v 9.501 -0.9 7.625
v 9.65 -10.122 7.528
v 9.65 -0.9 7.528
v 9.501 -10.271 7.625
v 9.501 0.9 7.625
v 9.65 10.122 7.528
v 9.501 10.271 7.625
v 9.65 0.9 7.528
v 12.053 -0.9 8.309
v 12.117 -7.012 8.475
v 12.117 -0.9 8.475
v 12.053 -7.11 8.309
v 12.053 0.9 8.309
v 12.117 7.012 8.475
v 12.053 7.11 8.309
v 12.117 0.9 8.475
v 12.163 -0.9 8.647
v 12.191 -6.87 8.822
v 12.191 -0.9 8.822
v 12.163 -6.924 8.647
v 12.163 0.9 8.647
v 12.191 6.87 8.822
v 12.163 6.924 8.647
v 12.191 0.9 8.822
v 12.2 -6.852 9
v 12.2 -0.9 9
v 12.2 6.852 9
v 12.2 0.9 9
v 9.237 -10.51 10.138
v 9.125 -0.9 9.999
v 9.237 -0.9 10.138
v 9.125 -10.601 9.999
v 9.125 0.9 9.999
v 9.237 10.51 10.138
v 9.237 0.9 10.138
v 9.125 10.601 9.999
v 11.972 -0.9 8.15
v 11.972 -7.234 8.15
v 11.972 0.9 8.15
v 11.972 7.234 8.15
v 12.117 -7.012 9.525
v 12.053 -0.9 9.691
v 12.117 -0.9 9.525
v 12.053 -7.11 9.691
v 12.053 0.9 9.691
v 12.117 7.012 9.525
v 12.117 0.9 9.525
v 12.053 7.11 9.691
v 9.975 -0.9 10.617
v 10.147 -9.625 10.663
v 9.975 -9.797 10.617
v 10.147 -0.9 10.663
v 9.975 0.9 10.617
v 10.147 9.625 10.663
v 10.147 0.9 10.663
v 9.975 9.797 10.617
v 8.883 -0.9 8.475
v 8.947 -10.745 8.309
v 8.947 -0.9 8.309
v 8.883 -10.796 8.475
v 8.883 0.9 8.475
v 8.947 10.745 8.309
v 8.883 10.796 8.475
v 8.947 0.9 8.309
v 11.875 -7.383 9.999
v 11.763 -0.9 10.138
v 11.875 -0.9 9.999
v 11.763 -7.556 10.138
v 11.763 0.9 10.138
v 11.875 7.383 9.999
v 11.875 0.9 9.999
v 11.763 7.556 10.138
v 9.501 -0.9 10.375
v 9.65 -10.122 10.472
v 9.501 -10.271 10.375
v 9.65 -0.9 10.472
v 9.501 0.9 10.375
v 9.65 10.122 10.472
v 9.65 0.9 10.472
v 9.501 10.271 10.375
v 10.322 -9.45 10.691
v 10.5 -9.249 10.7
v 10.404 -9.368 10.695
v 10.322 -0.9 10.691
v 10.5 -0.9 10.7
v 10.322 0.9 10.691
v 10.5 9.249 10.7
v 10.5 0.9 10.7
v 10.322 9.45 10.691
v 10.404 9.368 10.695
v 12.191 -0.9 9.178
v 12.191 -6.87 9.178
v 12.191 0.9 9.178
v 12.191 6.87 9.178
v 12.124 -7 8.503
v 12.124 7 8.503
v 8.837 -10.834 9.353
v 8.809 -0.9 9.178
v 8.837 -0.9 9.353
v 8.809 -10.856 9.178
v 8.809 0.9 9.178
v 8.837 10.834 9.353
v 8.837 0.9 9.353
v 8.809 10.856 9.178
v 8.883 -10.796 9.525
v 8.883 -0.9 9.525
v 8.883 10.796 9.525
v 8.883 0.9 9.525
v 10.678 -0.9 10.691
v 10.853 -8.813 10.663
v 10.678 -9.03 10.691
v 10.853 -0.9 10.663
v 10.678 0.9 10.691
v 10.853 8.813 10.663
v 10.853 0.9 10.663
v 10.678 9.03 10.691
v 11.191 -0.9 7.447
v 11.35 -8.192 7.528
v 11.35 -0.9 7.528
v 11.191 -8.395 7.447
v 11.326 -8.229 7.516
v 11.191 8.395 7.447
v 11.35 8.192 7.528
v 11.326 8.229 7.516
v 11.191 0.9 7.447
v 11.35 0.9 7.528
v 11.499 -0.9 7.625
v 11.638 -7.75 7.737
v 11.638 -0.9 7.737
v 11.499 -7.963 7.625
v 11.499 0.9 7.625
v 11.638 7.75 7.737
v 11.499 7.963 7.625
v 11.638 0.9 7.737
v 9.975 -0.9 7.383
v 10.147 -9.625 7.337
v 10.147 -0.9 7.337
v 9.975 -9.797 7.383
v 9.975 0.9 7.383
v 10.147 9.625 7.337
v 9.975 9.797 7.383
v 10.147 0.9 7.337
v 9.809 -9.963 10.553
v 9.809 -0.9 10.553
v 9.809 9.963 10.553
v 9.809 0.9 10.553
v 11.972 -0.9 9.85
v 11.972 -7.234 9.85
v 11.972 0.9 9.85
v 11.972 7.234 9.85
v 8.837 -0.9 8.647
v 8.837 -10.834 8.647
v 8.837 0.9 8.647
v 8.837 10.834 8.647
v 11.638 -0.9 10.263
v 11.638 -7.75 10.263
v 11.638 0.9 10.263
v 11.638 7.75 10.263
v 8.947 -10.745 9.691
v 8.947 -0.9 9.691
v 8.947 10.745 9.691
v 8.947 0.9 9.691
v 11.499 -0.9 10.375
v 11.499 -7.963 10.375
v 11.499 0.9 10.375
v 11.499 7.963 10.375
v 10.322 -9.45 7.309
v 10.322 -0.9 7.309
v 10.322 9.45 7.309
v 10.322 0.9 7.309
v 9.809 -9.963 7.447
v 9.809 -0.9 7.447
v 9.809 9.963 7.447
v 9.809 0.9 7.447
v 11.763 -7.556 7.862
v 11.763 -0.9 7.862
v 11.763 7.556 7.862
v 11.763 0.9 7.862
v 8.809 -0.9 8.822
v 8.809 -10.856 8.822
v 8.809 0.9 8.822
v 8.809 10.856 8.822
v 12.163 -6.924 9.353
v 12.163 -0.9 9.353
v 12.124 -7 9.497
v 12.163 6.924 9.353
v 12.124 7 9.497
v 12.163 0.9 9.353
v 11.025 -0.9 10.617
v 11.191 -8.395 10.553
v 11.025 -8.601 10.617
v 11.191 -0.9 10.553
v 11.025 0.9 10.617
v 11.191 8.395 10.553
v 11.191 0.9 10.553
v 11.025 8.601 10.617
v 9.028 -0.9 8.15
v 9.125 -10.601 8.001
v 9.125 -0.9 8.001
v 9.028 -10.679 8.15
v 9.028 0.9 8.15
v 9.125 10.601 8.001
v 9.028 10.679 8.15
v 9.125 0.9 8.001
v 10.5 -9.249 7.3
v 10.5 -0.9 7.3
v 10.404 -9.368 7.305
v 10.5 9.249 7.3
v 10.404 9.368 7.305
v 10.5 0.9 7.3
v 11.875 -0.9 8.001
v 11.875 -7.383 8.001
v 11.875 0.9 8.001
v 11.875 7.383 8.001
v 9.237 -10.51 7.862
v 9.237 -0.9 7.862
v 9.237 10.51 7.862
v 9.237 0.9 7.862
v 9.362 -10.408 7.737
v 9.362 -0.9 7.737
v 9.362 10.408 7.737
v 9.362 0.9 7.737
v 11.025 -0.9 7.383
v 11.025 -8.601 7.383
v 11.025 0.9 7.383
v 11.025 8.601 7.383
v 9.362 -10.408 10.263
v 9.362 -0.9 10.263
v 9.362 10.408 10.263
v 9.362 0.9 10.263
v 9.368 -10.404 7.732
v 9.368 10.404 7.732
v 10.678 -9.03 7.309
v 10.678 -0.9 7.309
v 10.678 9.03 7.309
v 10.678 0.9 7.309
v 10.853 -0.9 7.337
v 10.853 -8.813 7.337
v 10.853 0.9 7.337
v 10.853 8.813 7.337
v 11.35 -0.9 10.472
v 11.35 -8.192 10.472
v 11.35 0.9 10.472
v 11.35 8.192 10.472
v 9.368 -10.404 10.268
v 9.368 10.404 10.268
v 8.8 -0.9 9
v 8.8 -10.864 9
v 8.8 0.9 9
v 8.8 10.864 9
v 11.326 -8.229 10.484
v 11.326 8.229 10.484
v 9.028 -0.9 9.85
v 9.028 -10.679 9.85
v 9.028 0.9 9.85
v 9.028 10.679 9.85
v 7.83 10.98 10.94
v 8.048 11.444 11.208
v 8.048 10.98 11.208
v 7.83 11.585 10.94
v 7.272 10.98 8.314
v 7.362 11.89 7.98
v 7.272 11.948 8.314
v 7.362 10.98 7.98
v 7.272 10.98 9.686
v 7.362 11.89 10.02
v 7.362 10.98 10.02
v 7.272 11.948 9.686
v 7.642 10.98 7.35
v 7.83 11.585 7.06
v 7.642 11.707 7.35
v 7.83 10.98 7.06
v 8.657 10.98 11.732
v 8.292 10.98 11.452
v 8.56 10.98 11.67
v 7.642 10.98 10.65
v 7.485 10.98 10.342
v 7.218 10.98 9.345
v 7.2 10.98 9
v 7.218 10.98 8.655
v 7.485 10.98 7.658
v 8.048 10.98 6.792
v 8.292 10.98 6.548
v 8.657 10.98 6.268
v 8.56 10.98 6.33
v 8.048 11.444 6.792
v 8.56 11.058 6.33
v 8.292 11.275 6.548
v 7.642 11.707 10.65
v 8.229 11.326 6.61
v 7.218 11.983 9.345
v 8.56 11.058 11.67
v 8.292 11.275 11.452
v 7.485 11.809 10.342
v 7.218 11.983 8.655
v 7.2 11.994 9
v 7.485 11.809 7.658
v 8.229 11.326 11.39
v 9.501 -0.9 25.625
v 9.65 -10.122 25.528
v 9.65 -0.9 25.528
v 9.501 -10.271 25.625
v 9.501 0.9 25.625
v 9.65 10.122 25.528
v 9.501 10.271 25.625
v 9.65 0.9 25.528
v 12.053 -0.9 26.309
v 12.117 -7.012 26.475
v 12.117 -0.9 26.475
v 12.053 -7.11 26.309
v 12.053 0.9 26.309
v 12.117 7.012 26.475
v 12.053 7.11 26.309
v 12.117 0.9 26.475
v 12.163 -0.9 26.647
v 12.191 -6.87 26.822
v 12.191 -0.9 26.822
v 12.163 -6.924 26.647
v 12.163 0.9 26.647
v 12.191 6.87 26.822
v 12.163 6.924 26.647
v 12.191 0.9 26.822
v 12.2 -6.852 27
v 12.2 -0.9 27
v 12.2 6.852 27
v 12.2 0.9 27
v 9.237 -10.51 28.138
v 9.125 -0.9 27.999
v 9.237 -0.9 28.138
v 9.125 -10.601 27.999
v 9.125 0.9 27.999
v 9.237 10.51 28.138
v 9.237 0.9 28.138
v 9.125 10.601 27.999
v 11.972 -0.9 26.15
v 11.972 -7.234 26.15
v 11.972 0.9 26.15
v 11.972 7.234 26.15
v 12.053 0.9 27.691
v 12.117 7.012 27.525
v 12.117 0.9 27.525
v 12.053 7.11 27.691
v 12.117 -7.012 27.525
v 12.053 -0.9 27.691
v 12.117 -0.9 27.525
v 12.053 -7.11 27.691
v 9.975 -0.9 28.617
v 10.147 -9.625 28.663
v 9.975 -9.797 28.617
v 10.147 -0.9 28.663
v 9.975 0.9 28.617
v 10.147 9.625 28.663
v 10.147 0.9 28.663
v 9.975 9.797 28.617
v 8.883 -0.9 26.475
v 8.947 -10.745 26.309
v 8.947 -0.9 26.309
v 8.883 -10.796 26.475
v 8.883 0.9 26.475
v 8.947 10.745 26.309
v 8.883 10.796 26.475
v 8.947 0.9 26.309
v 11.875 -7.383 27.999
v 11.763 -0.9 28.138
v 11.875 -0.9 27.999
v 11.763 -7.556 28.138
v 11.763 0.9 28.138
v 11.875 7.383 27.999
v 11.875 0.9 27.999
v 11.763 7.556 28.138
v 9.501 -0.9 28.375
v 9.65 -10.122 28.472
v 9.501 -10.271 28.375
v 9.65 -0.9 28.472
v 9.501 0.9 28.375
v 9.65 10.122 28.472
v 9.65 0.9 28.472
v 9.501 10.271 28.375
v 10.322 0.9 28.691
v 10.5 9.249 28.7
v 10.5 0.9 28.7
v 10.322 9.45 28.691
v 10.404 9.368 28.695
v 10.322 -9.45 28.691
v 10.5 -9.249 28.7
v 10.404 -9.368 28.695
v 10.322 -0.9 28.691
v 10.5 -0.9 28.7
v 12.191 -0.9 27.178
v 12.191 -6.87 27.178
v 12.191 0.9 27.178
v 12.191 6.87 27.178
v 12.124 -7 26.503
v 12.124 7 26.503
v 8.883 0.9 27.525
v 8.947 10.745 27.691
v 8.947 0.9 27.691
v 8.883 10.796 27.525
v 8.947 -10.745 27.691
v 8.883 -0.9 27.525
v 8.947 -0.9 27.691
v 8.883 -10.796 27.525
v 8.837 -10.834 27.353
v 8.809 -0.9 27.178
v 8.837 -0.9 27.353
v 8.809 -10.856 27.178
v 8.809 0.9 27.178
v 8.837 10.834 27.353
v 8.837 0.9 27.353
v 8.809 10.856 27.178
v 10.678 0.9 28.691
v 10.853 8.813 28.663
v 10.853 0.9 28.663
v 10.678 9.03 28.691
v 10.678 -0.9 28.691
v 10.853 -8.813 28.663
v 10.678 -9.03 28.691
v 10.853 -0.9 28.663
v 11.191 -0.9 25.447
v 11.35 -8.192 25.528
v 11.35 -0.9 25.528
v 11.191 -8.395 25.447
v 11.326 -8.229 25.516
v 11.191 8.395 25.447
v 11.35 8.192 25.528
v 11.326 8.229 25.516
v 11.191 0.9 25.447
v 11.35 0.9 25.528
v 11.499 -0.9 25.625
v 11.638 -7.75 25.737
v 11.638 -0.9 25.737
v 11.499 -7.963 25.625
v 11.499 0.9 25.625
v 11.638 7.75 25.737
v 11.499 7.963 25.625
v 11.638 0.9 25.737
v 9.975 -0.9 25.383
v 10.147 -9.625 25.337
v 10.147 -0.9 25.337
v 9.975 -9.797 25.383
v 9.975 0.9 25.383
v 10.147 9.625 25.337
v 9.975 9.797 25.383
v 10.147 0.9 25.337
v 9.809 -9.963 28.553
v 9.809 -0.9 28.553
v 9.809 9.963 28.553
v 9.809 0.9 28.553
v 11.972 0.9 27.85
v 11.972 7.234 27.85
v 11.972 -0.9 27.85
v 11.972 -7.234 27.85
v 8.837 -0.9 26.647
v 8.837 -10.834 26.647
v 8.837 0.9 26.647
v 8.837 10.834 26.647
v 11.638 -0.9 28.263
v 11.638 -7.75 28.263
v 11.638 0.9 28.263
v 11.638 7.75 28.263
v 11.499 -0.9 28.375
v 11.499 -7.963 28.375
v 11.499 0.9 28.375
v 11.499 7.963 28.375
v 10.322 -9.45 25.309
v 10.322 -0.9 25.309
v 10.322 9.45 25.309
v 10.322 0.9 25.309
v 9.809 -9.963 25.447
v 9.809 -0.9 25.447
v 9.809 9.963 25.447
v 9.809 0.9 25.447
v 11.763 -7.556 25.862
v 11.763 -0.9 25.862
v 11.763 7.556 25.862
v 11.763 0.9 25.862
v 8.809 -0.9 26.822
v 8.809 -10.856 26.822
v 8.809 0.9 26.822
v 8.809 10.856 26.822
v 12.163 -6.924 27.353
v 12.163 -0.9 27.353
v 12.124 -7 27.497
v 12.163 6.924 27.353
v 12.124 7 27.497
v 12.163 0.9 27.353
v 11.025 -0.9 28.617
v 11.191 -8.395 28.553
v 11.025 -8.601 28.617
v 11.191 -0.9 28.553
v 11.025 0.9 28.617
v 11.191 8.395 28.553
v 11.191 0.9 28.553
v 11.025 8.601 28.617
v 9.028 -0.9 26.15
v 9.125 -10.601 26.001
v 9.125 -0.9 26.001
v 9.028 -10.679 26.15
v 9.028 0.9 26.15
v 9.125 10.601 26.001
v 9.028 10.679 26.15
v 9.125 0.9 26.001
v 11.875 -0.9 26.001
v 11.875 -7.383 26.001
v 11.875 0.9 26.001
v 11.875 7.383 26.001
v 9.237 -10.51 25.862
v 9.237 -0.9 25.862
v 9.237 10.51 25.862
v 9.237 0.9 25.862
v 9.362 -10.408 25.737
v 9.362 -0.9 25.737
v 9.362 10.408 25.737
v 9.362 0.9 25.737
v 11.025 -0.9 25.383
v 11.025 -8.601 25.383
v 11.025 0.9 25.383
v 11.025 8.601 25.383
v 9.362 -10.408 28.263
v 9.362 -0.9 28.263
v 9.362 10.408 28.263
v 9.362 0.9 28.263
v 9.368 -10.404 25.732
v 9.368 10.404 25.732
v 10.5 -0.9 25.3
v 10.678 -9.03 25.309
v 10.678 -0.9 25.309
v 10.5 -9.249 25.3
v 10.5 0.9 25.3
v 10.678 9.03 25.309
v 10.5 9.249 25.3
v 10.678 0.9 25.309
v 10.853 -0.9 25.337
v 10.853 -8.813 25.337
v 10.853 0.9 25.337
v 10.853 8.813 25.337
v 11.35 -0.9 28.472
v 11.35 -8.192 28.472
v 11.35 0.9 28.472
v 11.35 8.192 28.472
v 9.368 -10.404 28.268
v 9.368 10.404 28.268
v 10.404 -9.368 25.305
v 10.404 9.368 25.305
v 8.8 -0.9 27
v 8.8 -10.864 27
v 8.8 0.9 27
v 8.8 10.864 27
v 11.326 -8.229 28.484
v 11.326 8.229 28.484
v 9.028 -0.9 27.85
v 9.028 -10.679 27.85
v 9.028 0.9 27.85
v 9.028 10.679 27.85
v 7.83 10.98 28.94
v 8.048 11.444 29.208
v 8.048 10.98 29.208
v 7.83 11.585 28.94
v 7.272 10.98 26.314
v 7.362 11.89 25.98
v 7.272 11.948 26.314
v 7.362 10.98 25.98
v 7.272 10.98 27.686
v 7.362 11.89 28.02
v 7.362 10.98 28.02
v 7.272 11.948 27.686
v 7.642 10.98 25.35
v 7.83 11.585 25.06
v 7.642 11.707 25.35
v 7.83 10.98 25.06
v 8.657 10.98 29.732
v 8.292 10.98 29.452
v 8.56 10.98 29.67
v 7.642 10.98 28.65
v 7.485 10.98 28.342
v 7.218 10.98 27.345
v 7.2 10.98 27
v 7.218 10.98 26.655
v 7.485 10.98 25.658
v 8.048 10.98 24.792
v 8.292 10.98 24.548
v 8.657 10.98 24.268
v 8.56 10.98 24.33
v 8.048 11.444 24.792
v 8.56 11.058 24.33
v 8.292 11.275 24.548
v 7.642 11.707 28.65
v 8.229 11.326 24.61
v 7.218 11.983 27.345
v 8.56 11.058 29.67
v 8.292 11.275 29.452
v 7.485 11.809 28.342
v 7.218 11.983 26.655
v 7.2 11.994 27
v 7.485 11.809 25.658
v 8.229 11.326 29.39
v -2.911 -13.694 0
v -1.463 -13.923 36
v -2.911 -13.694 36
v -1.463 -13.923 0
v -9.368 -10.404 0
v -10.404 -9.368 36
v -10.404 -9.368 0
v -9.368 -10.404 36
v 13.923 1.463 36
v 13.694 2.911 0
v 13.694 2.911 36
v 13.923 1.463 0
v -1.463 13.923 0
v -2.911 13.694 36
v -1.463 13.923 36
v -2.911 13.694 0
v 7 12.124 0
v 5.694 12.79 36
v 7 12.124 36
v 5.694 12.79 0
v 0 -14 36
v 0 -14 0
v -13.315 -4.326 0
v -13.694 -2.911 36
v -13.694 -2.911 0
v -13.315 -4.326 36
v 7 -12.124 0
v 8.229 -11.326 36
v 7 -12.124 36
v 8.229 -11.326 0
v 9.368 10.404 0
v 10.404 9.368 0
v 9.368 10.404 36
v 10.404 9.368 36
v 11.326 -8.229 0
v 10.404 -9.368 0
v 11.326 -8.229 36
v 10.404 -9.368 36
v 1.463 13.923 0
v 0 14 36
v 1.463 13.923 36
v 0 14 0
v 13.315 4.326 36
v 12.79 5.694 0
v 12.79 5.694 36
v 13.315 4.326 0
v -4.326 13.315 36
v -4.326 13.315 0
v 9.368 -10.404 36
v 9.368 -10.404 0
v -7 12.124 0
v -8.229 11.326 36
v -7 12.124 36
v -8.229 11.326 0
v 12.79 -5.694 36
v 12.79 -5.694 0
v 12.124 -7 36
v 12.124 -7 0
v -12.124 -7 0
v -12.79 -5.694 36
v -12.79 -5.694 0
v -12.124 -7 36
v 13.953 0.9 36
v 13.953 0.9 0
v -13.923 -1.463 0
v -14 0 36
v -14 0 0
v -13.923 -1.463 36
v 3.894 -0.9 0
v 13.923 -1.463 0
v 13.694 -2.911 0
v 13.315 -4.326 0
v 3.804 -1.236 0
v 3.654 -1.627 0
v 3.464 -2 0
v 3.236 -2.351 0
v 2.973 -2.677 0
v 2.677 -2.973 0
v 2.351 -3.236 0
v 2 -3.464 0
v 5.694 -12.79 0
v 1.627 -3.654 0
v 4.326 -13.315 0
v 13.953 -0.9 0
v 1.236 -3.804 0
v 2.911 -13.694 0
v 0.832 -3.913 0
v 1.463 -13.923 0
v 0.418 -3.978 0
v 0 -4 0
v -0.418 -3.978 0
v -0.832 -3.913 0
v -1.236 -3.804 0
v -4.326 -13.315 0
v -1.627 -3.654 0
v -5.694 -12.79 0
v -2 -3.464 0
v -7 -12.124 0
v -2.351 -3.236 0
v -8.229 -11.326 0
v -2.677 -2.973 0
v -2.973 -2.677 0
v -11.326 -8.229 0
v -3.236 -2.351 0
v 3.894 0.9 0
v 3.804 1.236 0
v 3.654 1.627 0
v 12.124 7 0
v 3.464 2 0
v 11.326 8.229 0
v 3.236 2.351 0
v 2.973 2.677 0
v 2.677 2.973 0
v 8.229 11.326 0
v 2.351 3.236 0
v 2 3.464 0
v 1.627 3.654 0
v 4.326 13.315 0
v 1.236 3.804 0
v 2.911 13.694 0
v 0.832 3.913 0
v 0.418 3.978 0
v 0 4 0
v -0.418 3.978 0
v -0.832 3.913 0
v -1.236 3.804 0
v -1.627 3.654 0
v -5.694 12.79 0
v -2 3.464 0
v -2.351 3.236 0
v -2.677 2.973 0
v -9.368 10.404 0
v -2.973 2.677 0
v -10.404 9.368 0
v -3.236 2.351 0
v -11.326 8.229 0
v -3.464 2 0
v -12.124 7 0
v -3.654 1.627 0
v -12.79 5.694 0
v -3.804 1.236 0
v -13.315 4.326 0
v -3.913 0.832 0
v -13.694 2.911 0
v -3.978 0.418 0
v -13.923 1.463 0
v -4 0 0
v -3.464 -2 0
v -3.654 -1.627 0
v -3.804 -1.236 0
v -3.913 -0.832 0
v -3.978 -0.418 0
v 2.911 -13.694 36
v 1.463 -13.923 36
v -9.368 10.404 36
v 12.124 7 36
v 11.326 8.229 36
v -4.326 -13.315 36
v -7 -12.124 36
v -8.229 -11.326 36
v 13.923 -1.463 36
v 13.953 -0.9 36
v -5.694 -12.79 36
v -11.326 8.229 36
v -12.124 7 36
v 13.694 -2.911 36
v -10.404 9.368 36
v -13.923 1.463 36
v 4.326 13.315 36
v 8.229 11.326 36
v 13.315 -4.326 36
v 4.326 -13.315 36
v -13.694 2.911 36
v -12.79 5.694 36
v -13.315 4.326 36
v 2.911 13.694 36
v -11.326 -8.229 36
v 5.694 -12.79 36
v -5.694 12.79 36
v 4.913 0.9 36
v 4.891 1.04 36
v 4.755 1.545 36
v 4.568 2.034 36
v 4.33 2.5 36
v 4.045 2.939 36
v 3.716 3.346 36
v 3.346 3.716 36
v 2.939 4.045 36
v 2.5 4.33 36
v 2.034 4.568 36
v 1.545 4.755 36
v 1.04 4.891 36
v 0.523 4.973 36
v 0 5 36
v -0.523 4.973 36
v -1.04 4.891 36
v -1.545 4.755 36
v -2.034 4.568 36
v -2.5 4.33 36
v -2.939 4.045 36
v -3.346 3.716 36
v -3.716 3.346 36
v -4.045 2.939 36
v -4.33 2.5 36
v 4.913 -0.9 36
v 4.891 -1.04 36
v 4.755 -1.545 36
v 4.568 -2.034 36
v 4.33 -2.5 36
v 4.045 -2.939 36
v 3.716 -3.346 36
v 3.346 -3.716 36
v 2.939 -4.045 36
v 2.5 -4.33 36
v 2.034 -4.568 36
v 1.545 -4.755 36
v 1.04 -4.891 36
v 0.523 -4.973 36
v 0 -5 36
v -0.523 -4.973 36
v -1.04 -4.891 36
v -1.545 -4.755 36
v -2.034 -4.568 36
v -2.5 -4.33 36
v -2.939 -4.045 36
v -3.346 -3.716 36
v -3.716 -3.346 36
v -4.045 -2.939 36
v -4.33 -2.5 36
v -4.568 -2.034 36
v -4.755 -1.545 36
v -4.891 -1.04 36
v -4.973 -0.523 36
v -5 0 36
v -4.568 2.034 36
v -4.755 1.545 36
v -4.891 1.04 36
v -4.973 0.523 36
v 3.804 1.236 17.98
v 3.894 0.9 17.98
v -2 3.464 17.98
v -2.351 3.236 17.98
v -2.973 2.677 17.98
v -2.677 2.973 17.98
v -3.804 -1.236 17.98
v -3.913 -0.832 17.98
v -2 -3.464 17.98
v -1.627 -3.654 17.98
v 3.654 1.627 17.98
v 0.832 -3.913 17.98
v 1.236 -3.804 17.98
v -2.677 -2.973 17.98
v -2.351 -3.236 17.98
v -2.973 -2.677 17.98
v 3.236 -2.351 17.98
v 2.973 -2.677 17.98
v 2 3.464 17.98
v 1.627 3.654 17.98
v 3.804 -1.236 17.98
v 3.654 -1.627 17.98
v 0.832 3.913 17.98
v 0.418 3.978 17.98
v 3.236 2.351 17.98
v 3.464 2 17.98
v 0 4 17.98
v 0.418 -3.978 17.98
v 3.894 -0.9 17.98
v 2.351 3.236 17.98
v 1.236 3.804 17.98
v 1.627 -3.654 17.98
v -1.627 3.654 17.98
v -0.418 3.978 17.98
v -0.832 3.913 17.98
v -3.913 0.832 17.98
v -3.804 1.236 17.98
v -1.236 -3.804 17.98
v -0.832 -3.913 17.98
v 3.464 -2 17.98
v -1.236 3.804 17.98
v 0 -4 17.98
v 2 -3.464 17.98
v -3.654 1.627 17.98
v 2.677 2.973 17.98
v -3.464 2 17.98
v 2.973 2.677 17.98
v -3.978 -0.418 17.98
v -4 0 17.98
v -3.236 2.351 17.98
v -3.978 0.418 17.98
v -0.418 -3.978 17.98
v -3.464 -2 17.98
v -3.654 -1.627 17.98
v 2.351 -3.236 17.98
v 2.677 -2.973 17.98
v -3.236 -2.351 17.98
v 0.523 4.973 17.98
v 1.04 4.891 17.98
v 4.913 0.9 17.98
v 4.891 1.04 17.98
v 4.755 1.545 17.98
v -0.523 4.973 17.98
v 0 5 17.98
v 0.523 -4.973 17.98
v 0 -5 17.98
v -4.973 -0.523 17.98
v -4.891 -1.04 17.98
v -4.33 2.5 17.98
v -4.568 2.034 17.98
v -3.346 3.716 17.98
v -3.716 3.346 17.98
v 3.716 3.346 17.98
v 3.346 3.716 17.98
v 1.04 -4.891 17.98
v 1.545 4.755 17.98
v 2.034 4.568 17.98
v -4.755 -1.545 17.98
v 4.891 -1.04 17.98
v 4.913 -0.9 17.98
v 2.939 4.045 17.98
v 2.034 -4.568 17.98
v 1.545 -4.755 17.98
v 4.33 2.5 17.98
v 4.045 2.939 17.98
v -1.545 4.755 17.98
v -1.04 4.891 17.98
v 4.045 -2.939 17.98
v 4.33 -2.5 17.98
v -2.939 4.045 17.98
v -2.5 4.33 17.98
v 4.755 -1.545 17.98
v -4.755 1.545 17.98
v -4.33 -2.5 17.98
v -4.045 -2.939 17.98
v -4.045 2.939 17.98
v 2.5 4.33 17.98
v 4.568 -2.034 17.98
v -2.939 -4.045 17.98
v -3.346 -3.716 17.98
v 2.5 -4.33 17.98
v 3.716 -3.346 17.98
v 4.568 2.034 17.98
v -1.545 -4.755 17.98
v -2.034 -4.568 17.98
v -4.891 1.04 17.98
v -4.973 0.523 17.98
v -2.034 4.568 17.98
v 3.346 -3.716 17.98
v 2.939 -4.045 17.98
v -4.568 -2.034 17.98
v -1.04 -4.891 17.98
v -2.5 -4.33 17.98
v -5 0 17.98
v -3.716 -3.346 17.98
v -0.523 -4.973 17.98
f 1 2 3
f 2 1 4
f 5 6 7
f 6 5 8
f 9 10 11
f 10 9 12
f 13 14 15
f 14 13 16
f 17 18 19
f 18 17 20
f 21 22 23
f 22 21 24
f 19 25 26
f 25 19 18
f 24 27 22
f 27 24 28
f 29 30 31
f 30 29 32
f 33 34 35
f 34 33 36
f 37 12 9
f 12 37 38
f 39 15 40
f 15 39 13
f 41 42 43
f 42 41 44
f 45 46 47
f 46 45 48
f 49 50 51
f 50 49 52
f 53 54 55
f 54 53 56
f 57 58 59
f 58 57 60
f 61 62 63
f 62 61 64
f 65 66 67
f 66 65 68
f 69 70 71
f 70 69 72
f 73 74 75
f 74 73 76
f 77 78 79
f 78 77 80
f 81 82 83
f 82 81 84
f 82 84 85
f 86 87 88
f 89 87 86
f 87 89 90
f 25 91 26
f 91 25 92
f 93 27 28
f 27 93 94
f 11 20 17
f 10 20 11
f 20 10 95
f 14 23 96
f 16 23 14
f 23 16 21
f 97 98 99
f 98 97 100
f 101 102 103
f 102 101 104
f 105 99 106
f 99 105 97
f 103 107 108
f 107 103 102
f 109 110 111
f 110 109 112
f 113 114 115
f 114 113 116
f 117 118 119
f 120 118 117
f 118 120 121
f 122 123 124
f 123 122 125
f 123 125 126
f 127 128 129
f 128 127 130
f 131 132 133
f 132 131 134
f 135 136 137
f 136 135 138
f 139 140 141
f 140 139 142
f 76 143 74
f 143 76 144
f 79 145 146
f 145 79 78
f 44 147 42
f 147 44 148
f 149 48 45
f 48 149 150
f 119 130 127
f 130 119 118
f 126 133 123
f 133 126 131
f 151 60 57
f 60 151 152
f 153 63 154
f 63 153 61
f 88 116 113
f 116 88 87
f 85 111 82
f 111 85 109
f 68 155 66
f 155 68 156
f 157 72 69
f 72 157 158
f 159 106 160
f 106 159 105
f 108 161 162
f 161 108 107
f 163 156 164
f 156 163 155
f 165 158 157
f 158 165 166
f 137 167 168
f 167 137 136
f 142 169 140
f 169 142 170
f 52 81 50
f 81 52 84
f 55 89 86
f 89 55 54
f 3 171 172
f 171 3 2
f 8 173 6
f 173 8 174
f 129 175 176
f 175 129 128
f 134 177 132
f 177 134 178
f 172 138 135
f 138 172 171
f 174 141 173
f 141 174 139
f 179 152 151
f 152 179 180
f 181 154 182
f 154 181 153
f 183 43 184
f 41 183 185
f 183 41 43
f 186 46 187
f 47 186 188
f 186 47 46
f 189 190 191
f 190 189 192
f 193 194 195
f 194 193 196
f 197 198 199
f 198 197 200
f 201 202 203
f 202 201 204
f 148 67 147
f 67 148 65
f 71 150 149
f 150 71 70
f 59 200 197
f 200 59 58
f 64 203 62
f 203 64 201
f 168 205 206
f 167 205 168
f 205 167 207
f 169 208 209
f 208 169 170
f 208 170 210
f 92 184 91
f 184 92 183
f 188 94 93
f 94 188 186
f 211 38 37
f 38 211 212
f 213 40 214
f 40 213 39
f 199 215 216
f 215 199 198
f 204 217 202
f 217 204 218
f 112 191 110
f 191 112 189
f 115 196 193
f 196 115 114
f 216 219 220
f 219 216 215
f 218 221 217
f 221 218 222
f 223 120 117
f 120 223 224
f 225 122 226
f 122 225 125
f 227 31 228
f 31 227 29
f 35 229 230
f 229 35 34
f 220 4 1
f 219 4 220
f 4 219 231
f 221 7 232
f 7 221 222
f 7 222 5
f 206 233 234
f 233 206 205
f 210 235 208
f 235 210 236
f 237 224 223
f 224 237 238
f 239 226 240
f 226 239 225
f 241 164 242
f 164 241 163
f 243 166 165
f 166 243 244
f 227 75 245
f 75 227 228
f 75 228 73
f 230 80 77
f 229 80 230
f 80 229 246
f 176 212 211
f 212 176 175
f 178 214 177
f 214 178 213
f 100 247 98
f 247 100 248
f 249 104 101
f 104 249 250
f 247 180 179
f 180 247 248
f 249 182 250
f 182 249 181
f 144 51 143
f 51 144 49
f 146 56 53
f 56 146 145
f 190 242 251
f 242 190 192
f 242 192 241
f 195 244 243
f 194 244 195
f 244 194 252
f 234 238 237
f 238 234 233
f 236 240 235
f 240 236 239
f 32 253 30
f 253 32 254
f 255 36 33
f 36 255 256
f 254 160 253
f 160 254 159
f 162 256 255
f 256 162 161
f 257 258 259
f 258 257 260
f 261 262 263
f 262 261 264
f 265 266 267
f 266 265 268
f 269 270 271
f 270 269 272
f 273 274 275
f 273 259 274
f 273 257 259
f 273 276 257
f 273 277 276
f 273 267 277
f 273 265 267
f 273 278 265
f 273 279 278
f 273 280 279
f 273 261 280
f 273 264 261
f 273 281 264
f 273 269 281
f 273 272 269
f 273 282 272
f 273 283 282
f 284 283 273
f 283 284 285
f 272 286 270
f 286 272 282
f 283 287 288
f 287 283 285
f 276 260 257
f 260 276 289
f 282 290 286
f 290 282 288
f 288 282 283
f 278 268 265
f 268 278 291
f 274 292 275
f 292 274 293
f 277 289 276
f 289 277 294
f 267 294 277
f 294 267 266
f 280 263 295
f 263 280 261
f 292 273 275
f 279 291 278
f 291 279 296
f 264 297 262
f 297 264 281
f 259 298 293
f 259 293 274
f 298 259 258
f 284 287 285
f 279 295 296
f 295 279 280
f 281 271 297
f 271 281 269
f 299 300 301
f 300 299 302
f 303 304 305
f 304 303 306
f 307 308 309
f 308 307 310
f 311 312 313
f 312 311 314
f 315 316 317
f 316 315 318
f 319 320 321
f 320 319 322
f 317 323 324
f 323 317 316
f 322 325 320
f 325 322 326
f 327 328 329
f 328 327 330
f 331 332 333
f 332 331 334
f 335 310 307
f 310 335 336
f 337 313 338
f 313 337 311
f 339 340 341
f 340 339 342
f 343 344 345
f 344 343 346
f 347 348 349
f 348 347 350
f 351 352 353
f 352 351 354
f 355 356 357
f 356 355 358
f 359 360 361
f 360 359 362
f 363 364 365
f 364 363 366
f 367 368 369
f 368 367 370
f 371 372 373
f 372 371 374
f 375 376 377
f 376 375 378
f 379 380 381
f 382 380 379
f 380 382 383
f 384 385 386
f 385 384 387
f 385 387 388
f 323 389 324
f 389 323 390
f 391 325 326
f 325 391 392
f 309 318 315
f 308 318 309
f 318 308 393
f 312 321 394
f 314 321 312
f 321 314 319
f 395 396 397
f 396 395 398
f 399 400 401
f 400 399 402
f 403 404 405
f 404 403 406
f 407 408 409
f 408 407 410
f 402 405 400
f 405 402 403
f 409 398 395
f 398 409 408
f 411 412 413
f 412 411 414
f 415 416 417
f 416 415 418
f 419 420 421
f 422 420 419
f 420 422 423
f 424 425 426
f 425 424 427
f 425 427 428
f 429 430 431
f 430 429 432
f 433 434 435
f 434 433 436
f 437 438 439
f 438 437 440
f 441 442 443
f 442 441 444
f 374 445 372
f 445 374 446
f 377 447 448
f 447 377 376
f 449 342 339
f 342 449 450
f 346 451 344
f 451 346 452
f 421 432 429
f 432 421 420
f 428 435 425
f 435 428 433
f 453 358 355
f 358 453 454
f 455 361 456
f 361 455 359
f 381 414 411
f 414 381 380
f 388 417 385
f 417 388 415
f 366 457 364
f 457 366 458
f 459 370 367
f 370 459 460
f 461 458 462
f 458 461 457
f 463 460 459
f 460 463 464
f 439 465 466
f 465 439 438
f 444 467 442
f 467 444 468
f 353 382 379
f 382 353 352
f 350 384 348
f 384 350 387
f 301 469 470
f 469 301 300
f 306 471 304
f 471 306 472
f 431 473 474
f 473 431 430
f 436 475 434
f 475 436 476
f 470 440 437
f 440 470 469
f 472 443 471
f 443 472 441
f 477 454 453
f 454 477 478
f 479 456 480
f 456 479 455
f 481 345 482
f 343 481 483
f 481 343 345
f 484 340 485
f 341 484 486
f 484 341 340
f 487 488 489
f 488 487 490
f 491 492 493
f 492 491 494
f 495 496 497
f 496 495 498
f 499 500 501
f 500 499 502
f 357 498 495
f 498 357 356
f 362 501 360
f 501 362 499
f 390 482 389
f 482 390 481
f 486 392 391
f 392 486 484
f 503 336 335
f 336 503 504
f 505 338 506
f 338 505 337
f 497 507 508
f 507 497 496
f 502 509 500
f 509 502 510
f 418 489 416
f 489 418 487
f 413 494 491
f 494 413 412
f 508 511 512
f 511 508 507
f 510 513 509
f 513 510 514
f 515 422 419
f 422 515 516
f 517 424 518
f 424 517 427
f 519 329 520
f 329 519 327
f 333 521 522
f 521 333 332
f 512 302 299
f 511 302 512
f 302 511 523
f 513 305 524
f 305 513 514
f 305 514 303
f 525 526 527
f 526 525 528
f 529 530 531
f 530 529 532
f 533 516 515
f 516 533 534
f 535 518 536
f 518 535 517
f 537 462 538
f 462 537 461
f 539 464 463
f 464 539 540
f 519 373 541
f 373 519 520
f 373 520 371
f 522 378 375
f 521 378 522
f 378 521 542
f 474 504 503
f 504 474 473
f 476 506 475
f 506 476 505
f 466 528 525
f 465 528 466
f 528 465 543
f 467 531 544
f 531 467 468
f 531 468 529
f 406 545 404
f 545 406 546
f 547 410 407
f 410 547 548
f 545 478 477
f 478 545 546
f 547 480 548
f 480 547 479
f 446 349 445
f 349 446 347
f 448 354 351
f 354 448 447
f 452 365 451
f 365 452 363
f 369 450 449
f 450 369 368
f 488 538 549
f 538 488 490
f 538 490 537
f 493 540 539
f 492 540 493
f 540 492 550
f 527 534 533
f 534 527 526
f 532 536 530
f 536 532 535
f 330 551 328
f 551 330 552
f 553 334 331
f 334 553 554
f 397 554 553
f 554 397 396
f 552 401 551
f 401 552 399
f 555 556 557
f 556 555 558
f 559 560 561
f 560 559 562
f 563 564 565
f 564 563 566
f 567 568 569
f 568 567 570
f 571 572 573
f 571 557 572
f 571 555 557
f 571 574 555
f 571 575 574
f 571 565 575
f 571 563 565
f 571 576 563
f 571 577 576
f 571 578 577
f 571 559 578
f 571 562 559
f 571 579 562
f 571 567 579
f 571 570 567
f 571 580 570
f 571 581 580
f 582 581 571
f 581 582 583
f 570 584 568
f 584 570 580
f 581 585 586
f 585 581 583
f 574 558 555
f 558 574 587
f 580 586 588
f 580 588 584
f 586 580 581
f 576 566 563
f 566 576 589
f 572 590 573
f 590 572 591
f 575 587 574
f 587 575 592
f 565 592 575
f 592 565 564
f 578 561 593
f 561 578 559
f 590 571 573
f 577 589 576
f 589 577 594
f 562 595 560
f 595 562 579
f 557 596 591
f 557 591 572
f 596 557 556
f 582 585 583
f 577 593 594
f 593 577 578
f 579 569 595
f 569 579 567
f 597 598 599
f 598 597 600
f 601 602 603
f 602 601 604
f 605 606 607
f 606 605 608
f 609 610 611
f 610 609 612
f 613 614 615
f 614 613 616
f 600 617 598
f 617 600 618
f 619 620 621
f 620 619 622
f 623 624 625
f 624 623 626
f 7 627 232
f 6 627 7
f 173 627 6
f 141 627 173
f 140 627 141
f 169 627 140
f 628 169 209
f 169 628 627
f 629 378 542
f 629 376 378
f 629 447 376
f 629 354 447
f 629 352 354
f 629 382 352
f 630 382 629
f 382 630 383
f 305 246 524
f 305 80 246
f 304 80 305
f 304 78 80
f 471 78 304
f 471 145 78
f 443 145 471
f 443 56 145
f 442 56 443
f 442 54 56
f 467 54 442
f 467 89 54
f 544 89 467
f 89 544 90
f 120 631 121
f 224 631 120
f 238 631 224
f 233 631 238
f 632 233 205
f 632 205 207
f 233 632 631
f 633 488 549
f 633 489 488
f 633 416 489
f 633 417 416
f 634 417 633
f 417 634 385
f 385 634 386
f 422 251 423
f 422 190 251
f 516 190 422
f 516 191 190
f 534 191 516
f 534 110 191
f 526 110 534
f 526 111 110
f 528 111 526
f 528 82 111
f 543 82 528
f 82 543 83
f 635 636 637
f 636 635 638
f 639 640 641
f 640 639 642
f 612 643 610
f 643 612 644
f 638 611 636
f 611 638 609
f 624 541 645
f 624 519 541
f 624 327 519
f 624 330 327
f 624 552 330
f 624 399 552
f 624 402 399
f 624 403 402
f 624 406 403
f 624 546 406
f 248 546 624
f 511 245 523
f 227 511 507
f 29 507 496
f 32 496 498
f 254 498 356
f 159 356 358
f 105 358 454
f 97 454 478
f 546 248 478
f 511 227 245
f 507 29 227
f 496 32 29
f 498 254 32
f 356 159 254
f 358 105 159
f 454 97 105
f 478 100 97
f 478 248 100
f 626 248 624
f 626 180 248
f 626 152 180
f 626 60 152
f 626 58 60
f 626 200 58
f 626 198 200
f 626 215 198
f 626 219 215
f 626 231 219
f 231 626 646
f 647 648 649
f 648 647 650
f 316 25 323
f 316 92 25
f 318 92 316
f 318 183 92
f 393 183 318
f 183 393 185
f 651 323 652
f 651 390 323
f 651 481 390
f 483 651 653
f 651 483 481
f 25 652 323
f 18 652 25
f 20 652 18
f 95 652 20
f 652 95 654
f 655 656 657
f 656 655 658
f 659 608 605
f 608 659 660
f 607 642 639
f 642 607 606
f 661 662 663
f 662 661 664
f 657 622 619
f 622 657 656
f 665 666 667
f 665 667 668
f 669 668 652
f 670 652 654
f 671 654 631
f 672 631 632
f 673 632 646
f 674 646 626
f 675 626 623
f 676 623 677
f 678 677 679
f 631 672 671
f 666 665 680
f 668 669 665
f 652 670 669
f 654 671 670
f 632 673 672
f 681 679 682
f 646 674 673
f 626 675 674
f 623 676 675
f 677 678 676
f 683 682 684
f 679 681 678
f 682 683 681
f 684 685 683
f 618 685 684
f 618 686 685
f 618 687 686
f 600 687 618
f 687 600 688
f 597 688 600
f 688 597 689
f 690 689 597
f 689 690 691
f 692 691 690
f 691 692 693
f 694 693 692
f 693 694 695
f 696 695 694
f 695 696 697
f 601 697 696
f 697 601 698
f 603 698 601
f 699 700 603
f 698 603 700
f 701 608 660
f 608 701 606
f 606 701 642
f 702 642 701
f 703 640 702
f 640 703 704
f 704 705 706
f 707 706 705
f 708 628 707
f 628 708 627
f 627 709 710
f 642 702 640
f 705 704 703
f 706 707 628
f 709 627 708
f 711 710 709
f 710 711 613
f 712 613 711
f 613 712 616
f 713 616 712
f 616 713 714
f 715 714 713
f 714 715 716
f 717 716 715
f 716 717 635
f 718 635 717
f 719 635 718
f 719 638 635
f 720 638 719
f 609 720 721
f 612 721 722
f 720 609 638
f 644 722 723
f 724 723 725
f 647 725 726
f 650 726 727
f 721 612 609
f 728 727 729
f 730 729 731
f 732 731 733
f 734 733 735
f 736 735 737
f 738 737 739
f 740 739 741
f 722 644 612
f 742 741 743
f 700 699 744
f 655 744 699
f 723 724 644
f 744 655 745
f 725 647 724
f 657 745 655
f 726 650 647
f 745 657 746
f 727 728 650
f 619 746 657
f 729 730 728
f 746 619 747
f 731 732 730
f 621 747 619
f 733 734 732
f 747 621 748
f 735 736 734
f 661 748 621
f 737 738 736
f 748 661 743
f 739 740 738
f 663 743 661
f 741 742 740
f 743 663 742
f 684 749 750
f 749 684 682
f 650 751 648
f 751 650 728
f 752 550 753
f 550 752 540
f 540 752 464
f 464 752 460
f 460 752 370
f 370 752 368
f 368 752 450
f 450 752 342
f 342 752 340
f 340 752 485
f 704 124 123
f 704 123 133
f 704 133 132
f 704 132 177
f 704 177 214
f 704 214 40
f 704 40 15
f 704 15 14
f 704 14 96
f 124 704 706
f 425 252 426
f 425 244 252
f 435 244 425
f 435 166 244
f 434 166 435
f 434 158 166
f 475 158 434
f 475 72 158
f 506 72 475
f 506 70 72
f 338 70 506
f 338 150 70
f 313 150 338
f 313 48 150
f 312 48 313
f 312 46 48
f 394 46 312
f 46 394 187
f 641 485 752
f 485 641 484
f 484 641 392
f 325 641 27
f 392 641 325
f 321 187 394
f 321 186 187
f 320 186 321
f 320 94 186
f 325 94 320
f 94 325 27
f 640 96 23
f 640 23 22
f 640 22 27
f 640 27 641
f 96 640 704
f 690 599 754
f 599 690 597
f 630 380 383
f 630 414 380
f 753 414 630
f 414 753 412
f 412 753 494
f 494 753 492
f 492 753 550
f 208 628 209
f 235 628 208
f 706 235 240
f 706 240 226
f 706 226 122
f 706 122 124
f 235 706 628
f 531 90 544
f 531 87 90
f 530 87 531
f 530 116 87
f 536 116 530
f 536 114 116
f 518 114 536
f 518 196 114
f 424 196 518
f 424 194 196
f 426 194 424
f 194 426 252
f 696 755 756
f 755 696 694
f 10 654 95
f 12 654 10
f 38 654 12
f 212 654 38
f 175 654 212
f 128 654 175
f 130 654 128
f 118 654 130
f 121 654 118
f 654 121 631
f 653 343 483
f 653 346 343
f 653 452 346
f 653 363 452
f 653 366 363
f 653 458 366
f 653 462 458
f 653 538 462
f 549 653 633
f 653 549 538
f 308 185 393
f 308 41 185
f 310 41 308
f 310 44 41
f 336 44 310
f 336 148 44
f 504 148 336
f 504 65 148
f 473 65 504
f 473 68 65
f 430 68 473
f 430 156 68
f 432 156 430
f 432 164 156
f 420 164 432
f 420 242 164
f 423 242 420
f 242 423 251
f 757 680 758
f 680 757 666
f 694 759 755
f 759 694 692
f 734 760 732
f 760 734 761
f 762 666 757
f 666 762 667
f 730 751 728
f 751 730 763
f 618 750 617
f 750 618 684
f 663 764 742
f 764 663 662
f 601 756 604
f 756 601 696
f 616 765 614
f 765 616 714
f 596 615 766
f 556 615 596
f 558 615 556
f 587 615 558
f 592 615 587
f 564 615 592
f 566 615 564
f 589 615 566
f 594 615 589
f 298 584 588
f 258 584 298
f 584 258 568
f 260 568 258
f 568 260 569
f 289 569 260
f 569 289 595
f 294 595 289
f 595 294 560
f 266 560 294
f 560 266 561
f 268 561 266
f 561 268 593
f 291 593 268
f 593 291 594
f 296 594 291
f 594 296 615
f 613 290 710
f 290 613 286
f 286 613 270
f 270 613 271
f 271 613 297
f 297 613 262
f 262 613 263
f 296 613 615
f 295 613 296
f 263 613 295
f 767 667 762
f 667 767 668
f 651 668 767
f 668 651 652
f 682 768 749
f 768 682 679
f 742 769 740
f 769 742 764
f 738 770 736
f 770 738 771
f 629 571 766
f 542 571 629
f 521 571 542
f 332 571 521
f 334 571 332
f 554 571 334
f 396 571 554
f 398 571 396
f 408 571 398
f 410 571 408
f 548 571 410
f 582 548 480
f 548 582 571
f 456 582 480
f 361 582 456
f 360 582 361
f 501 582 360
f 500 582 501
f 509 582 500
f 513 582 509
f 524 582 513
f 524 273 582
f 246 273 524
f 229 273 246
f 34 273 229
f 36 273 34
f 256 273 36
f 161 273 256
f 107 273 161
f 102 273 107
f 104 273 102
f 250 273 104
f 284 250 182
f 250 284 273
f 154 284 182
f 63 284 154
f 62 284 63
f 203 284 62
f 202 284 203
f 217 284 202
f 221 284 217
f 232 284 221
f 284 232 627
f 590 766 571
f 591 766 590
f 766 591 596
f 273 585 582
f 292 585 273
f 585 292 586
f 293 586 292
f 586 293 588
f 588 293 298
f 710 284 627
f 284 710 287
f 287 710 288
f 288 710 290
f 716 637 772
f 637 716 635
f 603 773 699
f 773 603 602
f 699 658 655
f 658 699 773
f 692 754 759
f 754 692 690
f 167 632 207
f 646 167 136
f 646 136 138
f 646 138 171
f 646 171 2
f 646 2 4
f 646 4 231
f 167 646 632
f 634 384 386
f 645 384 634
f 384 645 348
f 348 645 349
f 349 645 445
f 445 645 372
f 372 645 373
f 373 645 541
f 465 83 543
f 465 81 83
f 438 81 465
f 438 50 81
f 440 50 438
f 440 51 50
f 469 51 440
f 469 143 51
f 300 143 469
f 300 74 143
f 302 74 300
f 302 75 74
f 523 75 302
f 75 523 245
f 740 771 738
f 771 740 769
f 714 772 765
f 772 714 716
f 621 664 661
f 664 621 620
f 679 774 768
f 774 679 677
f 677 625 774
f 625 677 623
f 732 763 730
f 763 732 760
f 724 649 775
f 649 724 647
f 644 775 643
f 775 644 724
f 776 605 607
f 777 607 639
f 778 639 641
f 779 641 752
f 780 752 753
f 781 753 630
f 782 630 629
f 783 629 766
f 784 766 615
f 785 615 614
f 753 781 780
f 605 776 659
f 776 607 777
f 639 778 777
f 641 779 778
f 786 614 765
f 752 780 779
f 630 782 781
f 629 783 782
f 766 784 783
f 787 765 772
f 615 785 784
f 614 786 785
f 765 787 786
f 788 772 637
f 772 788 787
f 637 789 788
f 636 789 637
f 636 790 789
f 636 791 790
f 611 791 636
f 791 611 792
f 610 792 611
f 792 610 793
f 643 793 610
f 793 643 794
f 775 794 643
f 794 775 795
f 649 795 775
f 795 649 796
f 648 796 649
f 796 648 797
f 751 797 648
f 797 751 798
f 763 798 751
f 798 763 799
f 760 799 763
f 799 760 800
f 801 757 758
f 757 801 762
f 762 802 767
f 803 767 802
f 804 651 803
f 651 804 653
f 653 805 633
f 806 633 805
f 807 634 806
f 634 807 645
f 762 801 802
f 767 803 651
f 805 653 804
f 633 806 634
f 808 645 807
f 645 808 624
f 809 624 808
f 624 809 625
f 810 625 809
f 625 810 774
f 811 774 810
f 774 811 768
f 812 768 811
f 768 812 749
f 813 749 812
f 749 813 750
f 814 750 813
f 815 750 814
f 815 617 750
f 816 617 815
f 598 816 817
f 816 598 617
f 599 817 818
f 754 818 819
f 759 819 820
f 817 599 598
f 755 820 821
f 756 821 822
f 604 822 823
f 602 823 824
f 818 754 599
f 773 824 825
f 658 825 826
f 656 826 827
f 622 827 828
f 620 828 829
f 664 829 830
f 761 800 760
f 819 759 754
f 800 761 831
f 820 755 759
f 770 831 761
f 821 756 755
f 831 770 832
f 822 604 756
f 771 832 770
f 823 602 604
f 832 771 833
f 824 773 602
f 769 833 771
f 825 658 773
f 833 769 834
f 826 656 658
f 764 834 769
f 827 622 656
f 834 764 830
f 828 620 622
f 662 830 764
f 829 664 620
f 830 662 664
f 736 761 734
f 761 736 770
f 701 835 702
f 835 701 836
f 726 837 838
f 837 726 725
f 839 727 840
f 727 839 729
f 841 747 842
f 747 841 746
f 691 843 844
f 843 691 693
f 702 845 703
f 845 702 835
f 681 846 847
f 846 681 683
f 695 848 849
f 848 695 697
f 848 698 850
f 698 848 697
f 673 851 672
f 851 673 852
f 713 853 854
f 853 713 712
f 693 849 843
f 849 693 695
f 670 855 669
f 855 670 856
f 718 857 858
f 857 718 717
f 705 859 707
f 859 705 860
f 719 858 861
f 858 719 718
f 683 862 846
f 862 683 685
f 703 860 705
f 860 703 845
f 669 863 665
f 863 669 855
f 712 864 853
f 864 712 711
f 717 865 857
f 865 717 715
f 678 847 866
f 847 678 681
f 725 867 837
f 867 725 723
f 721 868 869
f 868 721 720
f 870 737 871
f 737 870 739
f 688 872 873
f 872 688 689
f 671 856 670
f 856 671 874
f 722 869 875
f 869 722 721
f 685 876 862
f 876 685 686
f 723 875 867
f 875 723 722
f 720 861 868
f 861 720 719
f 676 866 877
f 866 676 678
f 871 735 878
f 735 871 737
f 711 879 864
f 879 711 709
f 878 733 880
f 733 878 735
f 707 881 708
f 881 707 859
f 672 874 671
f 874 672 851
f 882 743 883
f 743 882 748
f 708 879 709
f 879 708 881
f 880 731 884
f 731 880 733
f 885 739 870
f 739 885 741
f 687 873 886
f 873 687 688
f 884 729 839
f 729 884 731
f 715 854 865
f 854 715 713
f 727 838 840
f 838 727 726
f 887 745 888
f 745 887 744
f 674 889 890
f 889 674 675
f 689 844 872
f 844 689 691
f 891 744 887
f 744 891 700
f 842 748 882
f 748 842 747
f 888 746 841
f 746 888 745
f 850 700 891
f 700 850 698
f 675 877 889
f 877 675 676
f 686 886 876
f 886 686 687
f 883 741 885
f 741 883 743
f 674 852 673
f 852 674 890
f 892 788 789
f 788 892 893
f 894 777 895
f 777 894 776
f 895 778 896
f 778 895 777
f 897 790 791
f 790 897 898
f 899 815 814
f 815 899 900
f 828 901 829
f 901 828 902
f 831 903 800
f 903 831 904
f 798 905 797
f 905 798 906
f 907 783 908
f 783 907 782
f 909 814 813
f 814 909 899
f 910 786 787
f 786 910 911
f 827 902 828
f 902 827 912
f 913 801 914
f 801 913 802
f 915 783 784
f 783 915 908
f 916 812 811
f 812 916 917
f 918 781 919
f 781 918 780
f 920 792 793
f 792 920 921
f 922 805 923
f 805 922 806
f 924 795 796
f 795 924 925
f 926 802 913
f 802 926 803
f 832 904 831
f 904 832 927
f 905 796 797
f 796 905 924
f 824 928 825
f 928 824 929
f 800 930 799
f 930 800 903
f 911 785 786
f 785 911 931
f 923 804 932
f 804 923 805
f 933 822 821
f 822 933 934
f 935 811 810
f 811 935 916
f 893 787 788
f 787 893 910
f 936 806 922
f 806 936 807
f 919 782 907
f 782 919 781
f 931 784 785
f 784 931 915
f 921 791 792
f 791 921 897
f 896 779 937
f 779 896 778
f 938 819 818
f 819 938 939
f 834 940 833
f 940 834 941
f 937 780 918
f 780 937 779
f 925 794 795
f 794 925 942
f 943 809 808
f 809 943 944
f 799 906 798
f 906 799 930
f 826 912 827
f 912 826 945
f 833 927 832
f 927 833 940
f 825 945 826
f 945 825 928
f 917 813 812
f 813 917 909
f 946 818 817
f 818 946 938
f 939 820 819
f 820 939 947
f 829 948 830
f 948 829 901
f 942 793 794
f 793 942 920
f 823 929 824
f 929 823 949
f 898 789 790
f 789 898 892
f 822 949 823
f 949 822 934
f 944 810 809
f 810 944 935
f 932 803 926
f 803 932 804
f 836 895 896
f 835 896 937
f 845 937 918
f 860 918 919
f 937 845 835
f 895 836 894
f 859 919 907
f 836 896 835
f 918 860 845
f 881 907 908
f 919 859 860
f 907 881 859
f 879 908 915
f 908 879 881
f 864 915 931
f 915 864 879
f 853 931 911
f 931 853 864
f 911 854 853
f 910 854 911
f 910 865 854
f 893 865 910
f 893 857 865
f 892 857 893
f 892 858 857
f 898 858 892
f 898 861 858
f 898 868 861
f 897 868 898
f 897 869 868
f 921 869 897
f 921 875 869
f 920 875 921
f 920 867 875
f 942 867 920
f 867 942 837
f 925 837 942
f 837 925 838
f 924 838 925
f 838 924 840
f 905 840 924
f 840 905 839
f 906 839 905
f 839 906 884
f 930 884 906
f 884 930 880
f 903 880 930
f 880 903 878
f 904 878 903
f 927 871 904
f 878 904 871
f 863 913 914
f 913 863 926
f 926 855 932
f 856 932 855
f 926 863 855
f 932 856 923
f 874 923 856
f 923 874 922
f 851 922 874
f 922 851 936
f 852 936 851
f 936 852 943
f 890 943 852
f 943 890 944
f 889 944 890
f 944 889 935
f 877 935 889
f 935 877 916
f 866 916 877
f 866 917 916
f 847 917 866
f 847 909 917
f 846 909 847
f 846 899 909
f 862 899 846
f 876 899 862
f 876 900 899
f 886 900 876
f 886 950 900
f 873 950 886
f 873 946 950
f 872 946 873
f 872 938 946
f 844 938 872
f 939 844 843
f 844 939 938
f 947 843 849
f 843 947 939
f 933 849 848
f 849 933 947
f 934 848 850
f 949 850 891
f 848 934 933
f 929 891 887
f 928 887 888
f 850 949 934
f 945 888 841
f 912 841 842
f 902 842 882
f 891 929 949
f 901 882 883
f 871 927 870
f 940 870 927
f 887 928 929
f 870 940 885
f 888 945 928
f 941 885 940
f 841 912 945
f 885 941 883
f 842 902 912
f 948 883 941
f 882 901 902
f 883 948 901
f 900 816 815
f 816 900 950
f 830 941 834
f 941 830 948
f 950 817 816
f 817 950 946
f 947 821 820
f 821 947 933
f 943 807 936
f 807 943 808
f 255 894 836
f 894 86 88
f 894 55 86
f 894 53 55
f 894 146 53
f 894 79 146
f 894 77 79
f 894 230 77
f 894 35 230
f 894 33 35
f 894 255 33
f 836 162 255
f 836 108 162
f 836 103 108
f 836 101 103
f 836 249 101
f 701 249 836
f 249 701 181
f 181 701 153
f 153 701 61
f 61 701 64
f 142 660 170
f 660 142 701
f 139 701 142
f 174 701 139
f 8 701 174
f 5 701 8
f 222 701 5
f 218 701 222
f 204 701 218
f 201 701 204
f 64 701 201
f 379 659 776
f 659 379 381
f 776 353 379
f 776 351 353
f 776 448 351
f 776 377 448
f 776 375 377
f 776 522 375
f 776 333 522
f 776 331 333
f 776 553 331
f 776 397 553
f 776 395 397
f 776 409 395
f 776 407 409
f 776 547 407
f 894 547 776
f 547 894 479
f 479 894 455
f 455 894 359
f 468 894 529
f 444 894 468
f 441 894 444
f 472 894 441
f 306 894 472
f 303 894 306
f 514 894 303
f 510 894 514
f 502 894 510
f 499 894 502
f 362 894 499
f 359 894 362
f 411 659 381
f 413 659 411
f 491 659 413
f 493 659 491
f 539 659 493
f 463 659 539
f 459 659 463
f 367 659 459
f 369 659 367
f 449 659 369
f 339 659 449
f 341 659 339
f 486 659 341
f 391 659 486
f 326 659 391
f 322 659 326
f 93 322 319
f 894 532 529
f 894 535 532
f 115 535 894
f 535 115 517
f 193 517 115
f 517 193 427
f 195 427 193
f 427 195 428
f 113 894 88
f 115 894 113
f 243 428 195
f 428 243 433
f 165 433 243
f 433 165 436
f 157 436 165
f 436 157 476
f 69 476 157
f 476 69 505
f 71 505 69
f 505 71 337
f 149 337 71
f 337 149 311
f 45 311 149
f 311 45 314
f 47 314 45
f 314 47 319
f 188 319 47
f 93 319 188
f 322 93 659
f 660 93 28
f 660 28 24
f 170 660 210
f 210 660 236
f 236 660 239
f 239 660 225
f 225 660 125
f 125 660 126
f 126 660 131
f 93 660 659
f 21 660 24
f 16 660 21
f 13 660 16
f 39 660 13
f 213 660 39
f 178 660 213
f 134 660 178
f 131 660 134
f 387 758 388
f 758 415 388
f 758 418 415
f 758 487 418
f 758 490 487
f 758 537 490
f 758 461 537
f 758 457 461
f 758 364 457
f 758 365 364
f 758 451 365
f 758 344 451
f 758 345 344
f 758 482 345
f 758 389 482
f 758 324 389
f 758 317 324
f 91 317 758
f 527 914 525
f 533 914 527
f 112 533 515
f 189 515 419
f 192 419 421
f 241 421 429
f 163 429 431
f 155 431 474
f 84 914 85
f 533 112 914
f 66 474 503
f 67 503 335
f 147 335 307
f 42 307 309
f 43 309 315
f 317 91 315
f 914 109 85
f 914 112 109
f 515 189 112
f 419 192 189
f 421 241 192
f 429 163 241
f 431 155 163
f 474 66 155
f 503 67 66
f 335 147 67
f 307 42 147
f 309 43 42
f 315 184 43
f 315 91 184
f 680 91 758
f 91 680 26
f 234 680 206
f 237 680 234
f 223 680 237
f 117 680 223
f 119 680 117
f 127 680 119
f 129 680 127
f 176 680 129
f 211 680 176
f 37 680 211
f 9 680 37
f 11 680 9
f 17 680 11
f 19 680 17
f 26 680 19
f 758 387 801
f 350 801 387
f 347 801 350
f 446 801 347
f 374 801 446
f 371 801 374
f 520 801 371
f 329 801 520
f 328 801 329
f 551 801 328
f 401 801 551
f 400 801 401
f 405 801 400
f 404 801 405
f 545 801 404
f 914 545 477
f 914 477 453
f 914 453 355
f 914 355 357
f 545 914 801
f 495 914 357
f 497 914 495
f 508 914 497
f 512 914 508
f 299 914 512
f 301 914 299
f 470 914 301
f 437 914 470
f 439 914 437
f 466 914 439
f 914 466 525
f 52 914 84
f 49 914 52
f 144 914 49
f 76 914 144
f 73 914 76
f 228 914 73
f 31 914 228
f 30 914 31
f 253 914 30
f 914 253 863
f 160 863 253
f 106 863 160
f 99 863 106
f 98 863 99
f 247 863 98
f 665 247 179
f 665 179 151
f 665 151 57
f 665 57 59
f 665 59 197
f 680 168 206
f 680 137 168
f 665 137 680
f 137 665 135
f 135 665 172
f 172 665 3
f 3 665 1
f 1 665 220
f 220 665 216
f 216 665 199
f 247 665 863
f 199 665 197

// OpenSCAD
// Split shaft coupling 8 mm to 10 mm.
$fn = 60;
eps = 0.02;
shaft_a = 8;
shaft_b = 10;
outer_d = 28;
length = 36;
slit_w = 1.8;
screw_d = 3.4;
module clamp_hole(z) {
    translate([outer_d / 2 - 3.5, -outer_d / 2 - eps, z]) rotate([-90, 0, 0]) cylinder(d = screw_d, h = outer_d + 2 * eps);
    translate([outer_d / 2 - 3.5, outer_d / 2 - 3 - eps, z]) rotate([-90, 0, 0]) cylinder(d = 6.6, h = 3 + 2 * eps);
}
difference() {
    cylinder(d = outer_d, h = length);
    translate([0, 0, -eps]) cylinder(d = shaft_a, h = length / 2 + eps);
    translate([0, 0, length / 2 - eps]) cylinder(d = shaft_b, h = length / 2 + eps);
    translate([0, -slit_w / 2, -eps]) cube([outer_d / 2 + eps, slit_w, length + 2 * eps]);
    clamp_hole(length / 4);
    clamp_hole(3 * length / 4);
}
